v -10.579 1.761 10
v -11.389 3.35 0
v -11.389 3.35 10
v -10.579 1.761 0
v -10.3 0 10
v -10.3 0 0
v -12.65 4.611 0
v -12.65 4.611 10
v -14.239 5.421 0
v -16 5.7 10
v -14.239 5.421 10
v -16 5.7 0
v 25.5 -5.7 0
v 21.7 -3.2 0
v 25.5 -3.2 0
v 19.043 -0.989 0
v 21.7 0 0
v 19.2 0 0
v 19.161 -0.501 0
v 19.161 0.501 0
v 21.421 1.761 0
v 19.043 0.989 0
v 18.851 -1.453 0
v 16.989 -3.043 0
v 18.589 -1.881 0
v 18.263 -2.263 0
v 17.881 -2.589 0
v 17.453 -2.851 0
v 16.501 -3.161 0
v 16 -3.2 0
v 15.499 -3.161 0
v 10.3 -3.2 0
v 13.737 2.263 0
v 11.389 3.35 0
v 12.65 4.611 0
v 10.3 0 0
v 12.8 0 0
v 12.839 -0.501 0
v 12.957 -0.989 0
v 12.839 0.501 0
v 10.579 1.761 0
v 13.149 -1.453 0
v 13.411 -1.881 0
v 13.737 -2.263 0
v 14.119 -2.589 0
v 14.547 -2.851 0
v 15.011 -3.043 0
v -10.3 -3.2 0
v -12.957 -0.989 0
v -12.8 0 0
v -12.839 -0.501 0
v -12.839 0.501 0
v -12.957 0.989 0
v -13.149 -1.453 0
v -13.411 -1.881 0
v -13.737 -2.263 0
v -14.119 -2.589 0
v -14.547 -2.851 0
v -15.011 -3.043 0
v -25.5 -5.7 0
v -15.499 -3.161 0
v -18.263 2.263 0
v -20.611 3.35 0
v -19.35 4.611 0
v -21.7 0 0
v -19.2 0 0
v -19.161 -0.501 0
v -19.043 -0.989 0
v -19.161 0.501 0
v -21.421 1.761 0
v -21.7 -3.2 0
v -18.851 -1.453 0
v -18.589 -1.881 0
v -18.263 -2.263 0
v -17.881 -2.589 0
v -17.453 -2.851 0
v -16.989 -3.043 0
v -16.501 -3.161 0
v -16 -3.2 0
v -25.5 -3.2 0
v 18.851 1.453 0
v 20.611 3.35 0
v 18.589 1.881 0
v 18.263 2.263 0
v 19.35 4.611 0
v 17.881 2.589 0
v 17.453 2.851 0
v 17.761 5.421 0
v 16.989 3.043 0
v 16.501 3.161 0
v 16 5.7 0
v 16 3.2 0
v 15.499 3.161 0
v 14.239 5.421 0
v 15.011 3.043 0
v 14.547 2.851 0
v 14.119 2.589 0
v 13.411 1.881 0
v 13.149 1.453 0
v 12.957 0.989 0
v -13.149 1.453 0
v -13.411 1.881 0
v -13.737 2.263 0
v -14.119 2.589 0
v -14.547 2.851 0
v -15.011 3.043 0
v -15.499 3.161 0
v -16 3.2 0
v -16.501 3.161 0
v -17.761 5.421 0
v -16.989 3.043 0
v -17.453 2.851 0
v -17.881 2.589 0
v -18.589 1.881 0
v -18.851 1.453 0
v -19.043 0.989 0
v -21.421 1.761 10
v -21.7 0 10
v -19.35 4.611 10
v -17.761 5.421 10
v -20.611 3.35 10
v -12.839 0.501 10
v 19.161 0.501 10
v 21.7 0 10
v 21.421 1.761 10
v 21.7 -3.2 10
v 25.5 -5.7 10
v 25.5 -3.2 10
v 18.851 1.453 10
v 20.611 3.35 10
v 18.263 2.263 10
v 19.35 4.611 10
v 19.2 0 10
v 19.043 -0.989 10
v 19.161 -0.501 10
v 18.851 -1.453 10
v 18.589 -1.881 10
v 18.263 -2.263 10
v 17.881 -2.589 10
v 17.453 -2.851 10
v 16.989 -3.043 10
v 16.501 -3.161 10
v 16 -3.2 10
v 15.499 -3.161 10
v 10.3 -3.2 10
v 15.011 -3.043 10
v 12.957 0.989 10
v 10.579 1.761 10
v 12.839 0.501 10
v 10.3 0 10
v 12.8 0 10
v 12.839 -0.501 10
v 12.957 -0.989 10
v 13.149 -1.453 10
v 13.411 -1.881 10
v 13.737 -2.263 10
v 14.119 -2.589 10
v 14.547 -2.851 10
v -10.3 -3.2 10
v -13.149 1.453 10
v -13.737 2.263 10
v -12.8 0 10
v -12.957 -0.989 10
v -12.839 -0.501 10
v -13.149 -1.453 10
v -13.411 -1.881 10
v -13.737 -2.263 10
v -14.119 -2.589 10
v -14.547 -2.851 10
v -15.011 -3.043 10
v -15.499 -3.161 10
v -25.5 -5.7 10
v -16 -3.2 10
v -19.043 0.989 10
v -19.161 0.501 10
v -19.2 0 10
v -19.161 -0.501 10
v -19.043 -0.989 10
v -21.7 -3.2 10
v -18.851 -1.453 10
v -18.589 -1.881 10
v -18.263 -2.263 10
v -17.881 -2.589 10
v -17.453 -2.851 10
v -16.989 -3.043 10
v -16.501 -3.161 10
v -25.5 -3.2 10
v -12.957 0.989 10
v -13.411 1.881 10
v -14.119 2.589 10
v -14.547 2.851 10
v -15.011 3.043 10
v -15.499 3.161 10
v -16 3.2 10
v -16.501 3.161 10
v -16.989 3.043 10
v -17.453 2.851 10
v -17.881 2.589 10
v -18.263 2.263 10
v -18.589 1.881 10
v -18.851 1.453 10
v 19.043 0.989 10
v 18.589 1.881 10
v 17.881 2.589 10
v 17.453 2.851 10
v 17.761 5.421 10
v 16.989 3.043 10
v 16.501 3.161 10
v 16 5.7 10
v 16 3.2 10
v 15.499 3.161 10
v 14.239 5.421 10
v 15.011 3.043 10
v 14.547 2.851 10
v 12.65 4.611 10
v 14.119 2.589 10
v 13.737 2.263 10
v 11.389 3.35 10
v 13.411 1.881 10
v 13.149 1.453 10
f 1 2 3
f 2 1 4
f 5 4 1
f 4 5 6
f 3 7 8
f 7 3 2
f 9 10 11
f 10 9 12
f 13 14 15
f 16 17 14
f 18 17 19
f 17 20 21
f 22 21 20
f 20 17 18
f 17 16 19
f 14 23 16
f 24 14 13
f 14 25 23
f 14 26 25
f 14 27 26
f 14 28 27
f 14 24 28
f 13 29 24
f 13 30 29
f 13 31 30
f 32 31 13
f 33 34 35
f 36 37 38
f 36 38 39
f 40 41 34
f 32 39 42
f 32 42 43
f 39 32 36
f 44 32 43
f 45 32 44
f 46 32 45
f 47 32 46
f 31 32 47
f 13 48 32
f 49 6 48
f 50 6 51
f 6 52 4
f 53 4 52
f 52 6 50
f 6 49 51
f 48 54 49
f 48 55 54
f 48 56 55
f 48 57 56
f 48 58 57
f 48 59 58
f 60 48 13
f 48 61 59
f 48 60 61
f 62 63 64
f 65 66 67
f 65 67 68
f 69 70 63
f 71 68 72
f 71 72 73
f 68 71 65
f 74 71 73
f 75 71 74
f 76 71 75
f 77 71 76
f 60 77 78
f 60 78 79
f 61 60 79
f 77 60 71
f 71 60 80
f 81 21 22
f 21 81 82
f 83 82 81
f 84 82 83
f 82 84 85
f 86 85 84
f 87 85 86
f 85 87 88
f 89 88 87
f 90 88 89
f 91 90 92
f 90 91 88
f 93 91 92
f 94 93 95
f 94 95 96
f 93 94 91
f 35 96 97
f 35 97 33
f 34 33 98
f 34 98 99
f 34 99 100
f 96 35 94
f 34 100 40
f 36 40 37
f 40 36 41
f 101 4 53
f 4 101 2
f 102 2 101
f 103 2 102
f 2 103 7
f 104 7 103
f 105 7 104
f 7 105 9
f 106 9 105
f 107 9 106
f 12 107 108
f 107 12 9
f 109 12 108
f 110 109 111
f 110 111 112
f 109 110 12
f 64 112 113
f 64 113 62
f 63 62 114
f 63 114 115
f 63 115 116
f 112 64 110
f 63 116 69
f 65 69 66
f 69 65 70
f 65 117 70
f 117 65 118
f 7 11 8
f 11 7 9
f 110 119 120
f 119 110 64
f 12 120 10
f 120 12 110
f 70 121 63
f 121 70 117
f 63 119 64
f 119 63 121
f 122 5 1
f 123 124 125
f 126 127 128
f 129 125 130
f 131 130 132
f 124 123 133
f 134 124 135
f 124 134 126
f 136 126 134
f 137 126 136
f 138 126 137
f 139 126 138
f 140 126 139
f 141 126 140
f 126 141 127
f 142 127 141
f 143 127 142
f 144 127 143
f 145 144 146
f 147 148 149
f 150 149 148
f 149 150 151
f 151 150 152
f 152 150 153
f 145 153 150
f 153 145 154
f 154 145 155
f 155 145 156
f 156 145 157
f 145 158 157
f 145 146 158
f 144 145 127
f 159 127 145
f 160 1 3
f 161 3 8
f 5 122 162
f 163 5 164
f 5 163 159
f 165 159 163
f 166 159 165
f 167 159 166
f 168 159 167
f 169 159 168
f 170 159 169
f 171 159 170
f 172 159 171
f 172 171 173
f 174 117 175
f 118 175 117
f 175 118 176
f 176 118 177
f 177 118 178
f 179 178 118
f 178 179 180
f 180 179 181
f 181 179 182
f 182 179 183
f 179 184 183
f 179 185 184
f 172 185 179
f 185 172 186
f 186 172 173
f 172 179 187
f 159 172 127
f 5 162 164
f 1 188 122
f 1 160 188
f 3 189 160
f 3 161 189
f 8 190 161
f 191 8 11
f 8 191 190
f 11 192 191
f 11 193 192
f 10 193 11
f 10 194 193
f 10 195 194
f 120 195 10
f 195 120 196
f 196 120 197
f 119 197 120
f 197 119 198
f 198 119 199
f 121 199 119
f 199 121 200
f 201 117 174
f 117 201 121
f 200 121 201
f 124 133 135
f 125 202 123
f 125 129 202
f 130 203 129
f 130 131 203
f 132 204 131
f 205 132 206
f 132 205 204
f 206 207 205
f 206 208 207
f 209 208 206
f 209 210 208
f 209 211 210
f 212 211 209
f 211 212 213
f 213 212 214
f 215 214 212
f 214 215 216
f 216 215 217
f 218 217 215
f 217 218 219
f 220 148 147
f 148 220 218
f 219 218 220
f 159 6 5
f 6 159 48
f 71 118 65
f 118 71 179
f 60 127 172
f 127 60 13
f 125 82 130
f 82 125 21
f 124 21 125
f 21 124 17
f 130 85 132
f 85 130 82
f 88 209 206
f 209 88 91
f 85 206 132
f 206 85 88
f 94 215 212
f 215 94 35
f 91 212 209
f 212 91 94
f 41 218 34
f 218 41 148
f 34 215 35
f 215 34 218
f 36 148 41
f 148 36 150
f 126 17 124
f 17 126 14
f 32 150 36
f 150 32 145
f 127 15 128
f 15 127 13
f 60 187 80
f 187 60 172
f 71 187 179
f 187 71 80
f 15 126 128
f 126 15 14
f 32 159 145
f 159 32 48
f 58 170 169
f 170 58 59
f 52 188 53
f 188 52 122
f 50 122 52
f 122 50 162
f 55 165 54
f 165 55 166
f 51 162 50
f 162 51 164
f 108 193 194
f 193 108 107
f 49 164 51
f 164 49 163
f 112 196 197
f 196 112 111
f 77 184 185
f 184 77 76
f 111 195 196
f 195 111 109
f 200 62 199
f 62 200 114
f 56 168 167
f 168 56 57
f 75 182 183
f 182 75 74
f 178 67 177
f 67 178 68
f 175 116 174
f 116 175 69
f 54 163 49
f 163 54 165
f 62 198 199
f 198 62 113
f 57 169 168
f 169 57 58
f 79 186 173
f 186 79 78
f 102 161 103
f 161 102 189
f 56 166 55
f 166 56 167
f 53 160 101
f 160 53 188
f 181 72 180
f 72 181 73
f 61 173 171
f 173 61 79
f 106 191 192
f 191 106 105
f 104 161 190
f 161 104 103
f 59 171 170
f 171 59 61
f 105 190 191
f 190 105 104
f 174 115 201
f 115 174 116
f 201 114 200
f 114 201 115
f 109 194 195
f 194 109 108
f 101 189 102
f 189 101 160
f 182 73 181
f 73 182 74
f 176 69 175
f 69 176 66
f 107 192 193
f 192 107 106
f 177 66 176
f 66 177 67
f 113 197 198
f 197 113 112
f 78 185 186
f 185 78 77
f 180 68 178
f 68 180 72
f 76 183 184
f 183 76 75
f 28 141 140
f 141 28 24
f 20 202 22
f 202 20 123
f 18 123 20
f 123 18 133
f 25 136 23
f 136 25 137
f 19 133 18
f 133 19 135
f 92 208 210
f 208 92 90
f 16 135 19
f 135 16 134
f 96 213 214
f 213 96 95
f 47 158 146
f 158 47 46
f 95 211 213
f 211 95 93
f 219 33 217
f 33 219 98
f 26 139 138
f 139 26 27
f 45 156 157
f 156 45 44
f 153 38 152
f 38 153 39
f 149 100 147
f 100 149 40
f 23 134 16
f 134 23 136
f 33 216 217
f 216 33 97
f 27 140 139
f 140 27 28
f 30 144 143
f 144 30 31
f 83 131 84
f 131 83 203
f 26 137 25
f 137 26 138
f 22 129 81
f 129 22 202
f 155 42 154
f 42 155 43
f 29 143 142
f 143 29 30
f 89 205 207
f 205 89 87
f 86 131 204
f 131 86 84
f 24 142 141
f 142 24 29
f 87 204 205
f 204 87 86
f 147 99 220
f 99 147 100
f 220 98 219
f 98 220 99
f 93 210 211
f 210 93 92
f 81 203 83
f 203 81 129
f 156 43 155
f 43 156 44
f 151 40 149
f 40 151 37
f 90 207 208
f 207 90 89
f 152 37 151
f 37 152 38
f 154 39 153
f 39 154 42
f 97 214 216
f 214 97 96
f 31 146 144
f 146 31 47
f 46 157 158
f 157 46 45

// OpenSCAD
// file: dronePlates.scad
/**
 * dronePlates.scad
 * Plate library
 *
 * GNU GPL V3
 * @author: Victor Potenciano
 */

m3Rad = 3.4/2;
cornerR = 4;

/**
 *
 */
module helperDisk(diameter) {
	cylinder(r = diameter/2, h = 0.6, $fn=20);
}

/**
 *
 */
module roundedRect(size, radius) {
	x = size[0];
	y = size[1];
	z = size[2];

	linear_extrude(height=z)
	hull() {
	// place 4 circles in the corners, with the given radius
	translate([(-x/2)+(radius/2), (-y/2)+(radius/2), 0]){ circle(r=radius); }
	translate([(x/2)-(radius/2), (-y/2)+(radius/2), 0]){ circle(r=radius); }
	translate([(-x/2)+(radius/2), (y/2)-(radius/2), 0]){ circle(r=radius); }
	translate([(x/2)-(radius/2), (y/2)-(radius/2), 0]){ circle(r=radius); }
	}
}

/**
 * rounded rectangle triangle with corner at origin
 */
module roundedTriangle(size, radius) {
	x = size[0];
	y = size[1];
	z = size[2];

	linear_extrude(height=z)
	hull() {
	translate([radius, radius, 0]){ circle(r=radius); }
	translate([x-radius, radius, 0]){ circle(r=radius); }
	translate([radius, y-radius, 0]){ circle(r=radius); }
	}
}

/**
 *
 */
module roundRectPlate(w, l, plateThick=3) {
	difference(){
		roundedRect([l+m3Rad*1.75,w+m3Rad*1.75,plateThick], cornerR);
		translate([l/2, w/2, -0.5]) { cylinder(h = plateThick+1, r = m3Rad, $fn=30); }
		translate([-l/2, w/2, -0.5]) { cylinder(h = plateThick+1, r = m3Rad, $fn=30); }
		translate([l/2, -w/2, -0.5]) { cylinder(h = plateThick+1, r = m3Rad, $fn=30); }
		translate([-l/2, -w/2, -0.5]) { cylinder(h = plateThick+1, r = m3Rad, $fn=30); }
	}
}

/**
 *
 */
module crossSquarePlate(l, thick=3) {
	inDist = cornerR*2+4;
	trianL = sqrt((l*l)/2)-inDist;
	centerR = 4;

	difference(){
		roundRectPlate(l, l, thick);
		translate([0, centerR, -0.5]) { 
			rotate([0,0,45]){ roundedTriangle([trianL,trianL,thick+1], cornerR-2); }
		}
		translate([0, -centerR, -0.5]) { 
			rotate([0,0,225]){ roundedTriangle([trianL,trianL,thick+1], cornerR-2); }
		}
		translate([-centerR, 0, -0.5]) { 
			rotate([0,0,135]){ roundedTriangle([trianL,trianL,thick+1], cornerR-2); }
		}
		translate([centerR, 0, -0.5]) { 
			rotate([0,0,-45]){ roundedTriangle([trianL,trianL,thick+1], cornerR-2); }
		}
	}
}

/**
 *
 */
module hShapePlate(w, l, thick=4) {
	inDist = cornerR*2+1;

	difference(){
		roundRectPlate(w, l, thick);
		translate([0, w/4, -0.5]) { roundedRect([l-inDist,w/2-inDist,thick+1], cornerR-2); }
		translate([0, -w/4, -0.5]) { roundedRect([l-inDist,w/2-inDist,thick+1], cornerR-2); }
	}
}

/**
 *
 */
module motorCircleMount(inDia, outDia, thick=3, extraH=false, d1=19, d2=16, holeR=m3Rad ) {
	difference(){
		cylinder(h = thick, r = outDia/2, $fn=30);
		motorCircleMountHoles(inDia, outDia, thick, extraH, d1=d1, d2=d2, holeR=holeR);
	}
}

/**
 *
 */
module motorCircleMountHoles(inDia, outDia, thick=3, extraH=false, d1=19, d2=16, d3=25, holeR=m3Rad) {
	translate([0, 0, -0.5]) { cylinder(h = thick+1, r = inDia/2, $fn=30); }

	for(i=[0:3]) {
		rotate([0,0,90*i]){
		translate([d1/2, 0, -0.5]) cylinder(h = thick+1, r = holeR, $fn=20);
		translate([d2/2, 0, -0.5]) cylinder(h = thick+1, r = holeR, $fn=20);
		translate([d2/2, -holeR, -0.5]) cube(size = [(d1-d2)/2,holeR*2,thick+1]);
		}
	}
	
	if(extraH==true){	
		for(i=[-1,1]) translate([i*d3/2, 0, -0.5]) { cylinder(h = thick+1, r = holeR, $fn=30); }
	}
}

/**
 *
 */
module motorRectMount(w, l, inDia, thick=3) {
	d1=19;
	d2=16;

	difference(){
		roundRectPlate(w, l, thick);
		translate([0, 0, -0.5]) { cylinder(h = thick+1, r = inDia/2, $fn=30); }
		translate([0, d1/2, -0.5]) { cylinder(h = thick+1, r = m3Rad, $fn=30); }
		translate([0, -d1/2, -0.5]) { cylinder(h = thick+1, r = m3Rad, $fn=30); }
		translate([d2/2, 0, -0.5]) { cylinder(h = thick+1, r = m3Rad, $fn=30); }
		translate([-d2/2, 0, -0.5]) { cylinder(h = thick+1, r = m3Rad, $fn=30); }
	}
}

/**
 *
 */
module tube(inDia, outDia, height) {
	difference(){
		cylinder(h = height, r = outDia/2, $fn=50);
		translate([0, 0, -0.5]) { cylinder(h = height+1, r = inDia/2, $fn=30); }
	}
}

/**
 *
 */
module squareTube(inDia, outDia, height) {
	translate([0,0,height/2]){
	difference(){
		cube(size = [outDia,outDia,height], center = true);
		cube(size = [inDia,inDia,height+1], center = true);
	}
	}
}

/**
 *
 */
module djiFlamewheelHoles(height) {
	a = 23;
	b = 16;
	c = 19.5;
	
	translate([a/2, c/2, 0]) { cylinder(h = height, r = m3Rad, $fn=30); }
	translate([-a/2, c/2, 0]) { cylinder(h = height, r = m3Rad, $fn=30); }
	translate([b/2, -c/2, 0]) { cylinder(h = height, r = m3Rad, $fn=30); }
	translate([-b/2, -c/2, 0]) { cylinder(h = height, r = m3Rad, $fn=30); }
}

/**
 *
 */
module djiFlamewheelHolesBotton(height) {
	a1 = 21;
	c = 19.5;
	
	translate([a1/2, c/2, 0]) { cylinder(h = height, r = m3Rad, $fn=30); }
	translate([-a1/2, c/2, 0]) { cylinder(h = height, r = m3Rad, $fn=30); }
}

/**
 *
 */
module propeller(size){
union(){
difference(){
	cylinder(h = 3, r = size/2, center=true, $fn=30);
	cylinder(h = 3.1, r = size/2-2, center=true, $fn=30); 
}
for( i = [-1,1] ){
rotate([0,0,45*i]){ cube(size = [size,4,1], center = true); }
}
}
}

/**
 *
 */
module slot(length, height, rad){
for(i=[-1,1]) translate([i*length/2,0,0]) cylinder(h = height, r = rad, $fn=30);
translate([0,0,height/2]) cube(size = [length,rad*2,height], center = true);
}

 

////////////////////////
// Examples:
////////////////////////

motorCircleMount(8, 25, 3.5);

//roundedRect([50,50,3], 4);

//hShapePlate(79, 25);

//rotate([0,0,45]){roundedTriangle([40,40,3], 4);}

//crossSquarePlate(45, 4);

/*
union(){
motorRectMount(21, 18, 8, 4);
translate([9, 10.5, 0]) {tube(m3Rad*2, 6.5, 6);}
}
*/

/*
difference(){
union(){
hShapePlate(50, 30, 3.5);
translate([-4,-25,0]){cube(size = [8,50,3.5]);}
rotate([0, 0, 45]) {motorCircleMount(8, 35, 3.5);}
}
cylinder(h = 10, r = 4, $fn=100, center=true);
}
*/

//rotate([90,0,0]){ tube(5,10,20); }
//translate([20,0,0]){ squareTube(5, 10, 20); }
// main file
/**
 * WS2812B 8 led bumper
 */
 
use <dronePlates.scad>;

holeDist = 32;
spacerDia = 6.4;
thick = 2.5;

difference(){
union(){
for(i=[-1,1]) translate([i*holeDist/2,0,0]){
    cylinder(r=(spacerDia+5)/2,h=10,$fn=20);
    translate([0,-(spacerDia+5)/4,5]) cube(size=[spacerDia+5,(spacerDia+5)/2,10], center=true);
    }
    
translate([0,-(spacerDia/2+thick/2),5]) cube(size=[51,thick,10], center=true);
}//union

for(i=[-1,1]) translate([i*holeDist/2,0,0]){
    cylinder(r=spacerDia/2,h=10,$fn=40);
}
}
